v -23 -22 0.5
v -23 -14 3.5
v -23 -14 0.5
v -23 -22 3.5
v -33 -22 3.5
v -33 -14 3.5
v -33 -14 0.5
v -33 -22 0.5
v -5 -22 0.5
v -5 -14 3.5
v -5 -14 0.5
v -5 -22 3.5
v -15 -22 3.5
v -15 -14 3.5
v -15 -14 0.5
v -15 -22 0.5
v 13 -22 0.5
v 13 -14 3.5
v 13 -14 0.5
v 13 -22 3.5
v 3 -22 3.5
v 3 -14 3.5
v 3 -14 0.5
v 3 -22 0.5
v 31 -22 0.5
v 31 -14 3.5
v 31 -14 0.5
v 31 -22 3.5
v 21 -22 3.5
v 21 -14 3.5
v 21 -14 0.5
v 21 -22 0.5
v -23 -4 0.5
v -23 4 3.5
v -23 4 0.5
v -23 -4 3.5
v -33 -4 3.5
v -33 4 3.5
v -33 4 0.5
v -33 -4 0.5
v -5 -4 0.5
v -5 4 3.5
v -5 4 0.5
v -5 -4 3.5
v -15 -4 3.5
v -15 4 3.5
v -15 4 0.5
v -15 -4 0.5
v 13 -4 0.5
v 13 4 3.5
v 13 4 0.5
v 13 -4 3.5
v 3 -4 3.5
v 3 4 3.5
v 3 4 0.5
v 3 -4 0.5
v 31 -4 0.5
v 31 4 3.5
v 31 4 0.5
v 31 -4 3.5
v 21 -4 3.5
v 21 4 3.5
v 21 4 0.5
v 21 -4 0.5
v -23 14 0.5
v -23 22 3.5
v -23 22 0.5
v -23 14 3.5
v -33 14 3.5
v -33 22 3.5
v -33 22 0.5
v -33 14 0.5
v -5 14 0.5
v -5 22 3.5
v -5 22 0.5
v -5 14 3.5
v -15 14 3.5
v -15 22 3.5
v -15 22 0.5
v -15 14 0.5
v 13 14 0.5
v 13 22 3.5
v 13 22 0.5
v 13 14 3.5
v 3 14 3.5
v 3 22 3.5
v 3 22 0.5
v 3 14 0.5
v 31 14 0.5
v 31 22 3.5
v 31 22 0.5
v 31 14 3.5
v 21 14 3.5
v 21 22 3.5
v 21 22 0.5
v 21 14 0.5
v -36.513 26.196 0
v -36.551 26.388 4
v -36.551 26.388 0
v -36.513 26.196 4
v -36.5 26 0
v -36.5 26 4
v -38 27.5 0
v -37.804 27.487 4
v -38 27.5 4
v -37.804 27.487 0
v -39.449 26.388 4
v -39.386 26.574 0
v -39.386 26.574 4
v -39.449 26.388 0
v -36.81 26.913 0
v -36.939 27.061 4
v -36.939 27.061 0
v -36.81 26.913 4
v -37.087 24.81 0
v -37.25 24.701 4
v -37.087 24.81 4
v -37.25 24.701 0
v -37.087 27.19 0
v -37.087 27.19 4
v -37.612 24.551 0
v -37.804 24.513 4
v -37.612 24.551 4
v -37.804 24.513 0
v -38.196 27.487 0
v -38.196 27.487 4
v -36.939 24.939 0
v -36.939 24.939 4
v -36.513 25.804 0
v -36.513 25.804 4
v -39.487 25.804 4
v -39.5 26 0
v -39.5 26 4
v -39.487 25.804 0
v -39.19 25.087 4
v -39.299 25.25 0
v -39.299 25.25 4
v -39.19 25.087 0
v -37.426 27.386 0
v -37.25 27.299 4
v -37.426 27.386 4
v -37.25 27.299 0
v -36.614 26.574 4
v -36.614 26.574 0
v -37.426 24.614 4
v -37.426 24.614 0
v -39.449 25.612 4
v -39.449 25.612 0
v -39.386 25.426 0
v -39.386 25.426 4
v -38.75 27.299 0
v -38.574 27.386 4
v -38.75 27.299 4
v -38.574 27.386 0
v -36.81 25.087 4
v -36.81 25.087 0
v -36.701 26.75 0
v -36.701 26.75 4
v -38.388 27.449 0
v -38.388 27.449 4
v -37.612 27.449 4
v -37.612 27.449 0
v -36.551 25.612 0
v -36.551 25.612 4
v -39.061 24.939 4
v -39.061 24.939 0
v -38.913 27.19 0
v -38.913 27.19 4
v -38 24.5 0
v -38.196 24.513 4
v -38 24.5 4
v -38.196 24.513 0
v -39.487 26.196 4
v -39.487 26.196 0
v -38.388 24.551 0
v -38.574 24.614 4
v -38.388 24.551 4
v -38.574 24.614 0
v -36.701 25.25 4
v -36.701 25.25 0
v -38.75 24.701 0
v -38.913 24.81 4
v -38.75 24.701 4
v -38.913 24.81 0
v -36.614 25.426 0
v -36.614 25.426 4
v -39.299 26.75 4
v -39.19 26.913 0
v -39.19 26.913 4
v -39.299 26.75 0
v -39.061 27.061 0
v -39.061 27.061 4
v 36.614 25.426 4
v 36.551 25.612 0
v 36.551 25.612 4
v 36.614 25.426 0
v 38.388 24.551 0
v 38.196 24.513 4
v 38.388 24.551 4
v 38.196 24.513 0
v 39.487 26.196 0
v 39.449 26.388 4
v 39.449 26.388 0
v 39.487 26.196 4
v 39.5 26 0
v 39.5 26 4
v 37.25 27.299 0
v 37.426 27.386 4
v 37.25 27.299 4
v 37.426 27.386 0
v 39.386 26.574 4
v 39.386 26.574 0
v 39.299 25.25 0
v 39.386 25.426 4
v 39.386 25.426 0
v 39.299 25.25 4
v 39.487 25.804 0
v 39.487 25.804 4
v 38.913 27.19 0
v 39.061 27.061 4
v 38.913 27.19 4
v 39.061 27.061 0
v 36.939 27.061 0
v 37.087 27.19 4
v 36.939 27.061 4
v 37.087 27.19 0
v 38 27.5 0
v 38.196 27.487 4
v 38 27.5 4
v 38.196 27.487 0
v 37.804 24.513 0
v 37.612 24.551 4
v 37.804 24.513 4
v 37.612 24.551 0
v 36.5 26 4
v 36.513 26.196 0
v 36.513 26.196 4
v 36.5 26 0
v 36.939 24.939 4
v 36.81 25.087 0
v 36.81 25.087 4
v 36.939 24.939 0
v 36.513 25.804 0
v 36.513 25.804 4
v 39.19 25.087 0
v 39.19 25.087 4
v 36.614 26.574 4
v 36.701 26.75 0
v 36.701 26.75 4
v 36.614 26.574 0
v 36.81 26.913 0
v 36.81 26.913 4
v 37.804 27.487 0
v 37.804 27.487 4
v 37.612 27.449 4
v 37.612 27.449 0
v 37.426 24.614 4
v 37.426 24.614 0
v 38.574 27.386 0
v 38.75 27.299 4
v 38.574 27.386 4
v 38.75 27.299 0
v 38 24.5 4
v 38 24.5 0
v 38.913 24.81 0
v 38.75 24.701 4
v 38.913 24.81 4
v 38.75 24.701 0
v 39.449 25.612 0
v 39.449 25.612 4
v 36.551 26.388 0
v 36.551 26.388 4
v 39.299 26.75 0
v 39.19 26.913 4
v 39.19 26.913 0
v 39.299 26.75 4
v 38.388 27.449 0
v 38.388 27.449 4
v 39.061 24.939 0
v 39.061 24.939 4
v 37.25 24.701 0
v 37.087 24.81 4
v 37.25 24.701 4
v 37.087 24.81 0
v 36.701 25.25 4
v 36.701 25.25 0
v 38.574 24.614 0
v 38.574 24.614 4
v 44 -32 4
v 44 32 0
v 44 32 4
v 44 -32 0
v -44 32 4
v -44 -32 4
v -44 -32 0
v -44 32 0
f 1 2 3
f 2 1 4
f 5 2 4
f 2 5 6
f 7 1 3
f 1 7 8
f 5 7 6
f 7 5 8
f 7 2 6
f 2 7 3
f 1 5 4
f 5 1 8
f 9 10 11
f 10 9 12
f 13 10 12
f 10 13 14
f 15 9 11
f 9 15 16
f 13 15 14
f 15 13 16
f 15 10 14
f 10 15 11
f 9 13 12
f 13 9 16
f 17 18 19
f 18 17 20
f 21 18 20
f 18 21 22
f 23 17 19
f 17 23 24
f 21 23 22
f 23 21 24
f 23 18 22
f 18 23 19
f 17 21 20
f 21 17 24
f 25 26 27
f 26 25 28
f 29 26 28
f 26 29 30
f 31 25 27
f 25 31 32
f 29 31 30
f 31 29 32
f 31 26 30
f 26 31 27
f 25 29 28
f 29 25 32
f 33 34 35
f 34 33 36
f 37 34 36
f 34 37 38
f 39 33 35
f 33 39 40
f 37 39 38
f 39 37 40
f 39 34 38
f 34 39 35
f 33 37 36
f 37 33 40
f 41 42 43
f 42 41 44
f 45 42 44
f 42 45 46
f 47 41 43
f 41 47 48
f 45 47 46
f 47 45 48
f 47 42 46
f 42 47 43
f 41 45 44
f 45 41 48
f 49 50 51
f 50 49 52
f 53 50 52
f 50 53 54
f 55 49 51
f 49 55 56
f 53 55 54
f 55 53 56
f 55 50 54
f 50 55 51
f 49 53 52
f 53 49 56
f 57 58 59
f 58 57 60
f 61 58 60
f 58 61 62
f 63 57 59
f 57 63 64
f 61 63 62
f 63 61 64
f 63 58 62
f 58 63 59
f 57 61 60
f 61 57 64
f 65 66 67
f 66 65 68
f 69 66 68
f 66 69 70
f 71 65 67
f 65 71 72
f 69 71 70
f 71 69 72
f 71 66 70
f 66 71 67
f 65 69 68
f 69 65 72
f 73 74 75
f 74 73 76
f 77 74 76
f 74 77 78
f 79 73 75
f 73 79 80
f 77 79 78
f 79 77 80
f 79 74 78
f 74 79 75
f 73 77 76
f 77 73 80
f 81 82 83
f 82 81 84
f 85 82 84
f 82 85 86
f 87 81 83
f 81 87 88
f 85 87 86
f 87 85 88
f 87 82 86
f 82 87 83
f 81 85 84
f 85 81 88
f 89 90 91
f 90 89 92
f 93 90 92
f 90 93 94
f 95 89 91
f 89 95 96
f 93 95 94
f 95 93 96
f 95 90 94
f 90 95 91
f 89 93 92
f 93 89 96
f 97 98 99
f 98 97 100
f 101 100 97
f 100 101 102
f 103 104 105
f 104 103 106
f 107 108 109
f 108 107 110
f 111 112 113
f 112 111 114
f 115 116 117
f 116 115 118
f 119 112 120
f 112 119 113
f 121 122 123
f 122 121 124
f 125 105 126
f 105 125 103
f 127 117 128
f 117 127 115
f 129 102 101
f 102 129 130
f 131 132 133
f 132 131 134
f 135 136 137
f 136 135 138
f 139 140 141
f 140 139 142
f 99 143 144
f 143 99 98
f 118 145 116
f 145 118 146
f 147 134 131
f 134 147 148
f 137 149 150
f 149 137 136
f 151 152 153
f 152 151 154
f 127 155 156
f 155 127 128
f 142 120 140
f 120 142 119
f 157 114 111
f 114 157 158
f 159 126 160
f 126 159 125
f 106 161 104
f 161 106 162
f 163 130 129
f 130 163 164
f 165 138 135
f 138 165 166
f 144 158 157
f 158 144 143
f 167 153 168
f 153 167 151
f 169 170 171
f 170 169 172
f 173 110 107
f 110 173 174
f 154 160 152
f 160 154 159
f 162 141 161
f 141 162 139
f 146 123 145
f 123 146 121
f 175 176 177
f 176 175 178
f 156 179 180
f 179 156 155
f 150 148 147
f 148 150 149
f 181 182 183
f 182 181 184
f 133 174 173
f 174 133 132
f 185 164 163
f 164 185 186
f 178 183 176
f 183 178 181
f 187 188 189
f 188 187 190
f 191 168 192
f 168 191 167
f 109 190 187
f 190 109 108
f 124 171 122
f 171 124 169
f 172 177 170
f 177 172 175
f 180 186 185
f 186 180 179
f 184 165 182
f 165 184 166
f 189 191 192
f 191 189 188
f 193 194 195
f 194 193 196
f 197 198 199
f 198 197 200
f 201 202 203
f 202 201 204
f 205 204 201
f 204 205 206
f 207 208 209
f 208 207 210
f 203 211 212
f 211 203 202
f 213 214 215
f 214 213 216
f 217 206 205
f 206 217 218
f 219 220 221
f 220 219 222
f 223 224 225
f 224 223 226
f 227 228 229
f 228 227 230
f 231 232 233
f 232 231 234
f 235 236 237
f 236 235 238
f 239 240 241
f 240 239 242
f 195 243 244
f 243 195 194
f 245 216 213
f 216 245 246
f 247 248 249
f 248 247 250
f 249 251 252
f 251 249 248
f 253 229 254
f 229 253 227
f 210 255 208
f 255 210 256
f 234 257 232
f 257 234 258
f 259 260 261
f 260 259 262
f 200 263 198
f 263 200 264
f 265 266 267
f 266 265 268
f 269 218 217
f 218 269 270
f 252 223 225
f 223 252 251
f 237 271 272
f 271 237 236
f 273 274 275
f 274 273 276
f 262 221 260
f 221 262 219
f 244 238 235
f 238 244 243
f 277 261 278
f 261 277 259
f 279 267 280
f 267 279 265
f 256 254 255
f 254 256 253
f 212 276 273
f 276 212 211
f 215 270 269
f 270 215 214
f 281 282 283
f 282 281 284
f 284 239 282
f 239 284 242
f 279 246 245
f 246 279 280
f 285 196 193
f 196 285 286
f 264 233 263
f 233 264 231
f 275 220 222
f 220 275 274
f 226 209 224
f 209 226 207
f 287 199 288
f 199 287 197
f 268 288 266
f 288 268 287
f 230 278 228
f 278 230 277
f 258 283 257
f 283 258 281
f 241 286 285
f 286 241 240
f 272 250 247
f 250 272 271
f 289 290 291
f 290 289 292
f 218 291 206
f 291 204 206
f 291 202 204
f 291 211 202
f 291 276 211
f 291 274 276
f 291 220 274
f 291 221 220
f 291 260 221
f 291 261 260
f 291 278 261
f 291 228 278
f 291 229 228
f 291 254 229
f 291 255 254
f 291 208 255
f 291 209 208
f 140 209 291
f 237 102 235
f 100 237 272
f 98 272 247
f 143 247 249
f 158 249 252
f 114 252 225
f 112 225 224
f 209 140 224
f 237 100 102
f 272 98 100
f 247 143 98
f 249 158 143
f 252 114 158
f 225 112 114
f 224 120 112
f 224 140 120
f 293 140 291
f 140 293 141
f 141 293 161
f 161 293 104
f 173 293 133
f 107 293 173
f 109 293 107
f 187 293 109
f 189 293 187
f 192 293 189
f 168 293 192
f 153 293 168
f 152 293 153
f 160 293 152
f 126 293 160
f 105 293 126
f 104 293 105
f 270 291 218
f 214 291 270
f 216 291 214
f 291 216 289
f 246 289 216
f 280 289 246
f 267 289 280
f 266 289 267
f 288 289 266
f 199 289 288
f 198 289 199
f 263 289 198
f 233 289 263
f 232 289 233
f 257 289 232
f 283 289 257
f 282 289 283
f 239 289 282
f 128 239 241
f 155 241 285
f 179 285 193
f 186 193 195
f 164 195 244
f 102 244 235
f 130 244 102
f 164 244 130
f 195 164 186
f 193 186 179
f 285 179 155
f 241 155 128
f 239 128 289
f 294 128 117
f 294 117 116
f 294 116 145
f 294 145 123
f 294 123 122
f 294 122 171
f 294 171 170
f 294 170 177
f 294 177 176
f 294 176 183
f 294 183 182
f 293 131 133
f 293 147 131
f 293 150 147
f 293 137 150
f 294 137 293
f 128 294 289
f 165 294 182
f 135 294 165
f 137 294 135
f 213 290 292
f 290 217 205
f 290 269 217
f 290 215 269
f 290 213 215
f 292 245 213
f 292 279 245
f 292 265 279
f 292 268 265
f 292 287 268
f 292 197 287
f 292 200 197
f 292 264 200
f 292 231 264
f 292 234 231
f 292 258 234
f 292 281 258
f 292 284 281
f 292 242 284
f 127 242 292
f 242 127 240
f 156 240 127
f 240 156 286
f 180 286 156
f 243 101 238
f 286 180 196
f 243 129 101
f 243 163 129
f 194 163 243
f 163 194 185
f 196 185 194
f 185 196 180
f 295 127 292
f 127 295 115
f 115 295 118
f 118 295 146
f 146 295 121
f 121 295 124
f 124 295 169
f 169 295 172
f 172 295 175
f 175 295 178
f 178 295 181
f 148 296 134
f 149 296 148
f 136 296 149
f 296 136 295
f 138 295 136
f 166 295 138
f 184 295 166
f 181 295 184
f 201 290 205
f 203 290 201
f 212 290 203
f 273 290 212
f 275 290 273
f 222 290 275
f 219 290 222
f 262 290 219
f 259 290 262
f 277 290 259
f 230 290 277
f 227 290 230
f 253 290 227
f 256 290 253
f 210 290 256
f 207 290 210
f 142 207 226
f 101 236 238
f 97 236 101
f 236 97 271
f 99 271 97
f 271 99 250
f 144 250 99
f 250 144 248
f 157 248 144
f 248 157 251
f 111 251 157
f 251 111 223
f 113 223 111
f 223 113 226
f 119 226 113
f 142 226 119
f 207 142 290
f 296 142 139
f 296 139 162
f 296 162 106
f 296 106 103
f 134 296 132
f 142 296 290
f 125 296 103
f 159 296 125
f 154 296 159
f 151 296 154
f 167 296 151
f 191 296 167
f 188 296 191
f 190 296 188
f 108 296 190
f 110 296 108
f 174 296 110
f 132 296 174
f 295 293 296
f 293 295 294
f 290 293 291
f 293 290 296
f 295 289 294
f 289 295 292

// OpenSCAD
$fn = 48;
module qfn_tray() {
    difference() {
        translate([-44,-32,0]) cube([88,64,4]);
        for (row=[0:2]) for (col=[0:3]) translate([-28+col*18,-18+row*18,2]) cube([10,8,3], center=true);
        for (x=[-38,38]) translate([x,26,-1]) cylinder(h=6,d=3);
    }
}
qfn_tray();
